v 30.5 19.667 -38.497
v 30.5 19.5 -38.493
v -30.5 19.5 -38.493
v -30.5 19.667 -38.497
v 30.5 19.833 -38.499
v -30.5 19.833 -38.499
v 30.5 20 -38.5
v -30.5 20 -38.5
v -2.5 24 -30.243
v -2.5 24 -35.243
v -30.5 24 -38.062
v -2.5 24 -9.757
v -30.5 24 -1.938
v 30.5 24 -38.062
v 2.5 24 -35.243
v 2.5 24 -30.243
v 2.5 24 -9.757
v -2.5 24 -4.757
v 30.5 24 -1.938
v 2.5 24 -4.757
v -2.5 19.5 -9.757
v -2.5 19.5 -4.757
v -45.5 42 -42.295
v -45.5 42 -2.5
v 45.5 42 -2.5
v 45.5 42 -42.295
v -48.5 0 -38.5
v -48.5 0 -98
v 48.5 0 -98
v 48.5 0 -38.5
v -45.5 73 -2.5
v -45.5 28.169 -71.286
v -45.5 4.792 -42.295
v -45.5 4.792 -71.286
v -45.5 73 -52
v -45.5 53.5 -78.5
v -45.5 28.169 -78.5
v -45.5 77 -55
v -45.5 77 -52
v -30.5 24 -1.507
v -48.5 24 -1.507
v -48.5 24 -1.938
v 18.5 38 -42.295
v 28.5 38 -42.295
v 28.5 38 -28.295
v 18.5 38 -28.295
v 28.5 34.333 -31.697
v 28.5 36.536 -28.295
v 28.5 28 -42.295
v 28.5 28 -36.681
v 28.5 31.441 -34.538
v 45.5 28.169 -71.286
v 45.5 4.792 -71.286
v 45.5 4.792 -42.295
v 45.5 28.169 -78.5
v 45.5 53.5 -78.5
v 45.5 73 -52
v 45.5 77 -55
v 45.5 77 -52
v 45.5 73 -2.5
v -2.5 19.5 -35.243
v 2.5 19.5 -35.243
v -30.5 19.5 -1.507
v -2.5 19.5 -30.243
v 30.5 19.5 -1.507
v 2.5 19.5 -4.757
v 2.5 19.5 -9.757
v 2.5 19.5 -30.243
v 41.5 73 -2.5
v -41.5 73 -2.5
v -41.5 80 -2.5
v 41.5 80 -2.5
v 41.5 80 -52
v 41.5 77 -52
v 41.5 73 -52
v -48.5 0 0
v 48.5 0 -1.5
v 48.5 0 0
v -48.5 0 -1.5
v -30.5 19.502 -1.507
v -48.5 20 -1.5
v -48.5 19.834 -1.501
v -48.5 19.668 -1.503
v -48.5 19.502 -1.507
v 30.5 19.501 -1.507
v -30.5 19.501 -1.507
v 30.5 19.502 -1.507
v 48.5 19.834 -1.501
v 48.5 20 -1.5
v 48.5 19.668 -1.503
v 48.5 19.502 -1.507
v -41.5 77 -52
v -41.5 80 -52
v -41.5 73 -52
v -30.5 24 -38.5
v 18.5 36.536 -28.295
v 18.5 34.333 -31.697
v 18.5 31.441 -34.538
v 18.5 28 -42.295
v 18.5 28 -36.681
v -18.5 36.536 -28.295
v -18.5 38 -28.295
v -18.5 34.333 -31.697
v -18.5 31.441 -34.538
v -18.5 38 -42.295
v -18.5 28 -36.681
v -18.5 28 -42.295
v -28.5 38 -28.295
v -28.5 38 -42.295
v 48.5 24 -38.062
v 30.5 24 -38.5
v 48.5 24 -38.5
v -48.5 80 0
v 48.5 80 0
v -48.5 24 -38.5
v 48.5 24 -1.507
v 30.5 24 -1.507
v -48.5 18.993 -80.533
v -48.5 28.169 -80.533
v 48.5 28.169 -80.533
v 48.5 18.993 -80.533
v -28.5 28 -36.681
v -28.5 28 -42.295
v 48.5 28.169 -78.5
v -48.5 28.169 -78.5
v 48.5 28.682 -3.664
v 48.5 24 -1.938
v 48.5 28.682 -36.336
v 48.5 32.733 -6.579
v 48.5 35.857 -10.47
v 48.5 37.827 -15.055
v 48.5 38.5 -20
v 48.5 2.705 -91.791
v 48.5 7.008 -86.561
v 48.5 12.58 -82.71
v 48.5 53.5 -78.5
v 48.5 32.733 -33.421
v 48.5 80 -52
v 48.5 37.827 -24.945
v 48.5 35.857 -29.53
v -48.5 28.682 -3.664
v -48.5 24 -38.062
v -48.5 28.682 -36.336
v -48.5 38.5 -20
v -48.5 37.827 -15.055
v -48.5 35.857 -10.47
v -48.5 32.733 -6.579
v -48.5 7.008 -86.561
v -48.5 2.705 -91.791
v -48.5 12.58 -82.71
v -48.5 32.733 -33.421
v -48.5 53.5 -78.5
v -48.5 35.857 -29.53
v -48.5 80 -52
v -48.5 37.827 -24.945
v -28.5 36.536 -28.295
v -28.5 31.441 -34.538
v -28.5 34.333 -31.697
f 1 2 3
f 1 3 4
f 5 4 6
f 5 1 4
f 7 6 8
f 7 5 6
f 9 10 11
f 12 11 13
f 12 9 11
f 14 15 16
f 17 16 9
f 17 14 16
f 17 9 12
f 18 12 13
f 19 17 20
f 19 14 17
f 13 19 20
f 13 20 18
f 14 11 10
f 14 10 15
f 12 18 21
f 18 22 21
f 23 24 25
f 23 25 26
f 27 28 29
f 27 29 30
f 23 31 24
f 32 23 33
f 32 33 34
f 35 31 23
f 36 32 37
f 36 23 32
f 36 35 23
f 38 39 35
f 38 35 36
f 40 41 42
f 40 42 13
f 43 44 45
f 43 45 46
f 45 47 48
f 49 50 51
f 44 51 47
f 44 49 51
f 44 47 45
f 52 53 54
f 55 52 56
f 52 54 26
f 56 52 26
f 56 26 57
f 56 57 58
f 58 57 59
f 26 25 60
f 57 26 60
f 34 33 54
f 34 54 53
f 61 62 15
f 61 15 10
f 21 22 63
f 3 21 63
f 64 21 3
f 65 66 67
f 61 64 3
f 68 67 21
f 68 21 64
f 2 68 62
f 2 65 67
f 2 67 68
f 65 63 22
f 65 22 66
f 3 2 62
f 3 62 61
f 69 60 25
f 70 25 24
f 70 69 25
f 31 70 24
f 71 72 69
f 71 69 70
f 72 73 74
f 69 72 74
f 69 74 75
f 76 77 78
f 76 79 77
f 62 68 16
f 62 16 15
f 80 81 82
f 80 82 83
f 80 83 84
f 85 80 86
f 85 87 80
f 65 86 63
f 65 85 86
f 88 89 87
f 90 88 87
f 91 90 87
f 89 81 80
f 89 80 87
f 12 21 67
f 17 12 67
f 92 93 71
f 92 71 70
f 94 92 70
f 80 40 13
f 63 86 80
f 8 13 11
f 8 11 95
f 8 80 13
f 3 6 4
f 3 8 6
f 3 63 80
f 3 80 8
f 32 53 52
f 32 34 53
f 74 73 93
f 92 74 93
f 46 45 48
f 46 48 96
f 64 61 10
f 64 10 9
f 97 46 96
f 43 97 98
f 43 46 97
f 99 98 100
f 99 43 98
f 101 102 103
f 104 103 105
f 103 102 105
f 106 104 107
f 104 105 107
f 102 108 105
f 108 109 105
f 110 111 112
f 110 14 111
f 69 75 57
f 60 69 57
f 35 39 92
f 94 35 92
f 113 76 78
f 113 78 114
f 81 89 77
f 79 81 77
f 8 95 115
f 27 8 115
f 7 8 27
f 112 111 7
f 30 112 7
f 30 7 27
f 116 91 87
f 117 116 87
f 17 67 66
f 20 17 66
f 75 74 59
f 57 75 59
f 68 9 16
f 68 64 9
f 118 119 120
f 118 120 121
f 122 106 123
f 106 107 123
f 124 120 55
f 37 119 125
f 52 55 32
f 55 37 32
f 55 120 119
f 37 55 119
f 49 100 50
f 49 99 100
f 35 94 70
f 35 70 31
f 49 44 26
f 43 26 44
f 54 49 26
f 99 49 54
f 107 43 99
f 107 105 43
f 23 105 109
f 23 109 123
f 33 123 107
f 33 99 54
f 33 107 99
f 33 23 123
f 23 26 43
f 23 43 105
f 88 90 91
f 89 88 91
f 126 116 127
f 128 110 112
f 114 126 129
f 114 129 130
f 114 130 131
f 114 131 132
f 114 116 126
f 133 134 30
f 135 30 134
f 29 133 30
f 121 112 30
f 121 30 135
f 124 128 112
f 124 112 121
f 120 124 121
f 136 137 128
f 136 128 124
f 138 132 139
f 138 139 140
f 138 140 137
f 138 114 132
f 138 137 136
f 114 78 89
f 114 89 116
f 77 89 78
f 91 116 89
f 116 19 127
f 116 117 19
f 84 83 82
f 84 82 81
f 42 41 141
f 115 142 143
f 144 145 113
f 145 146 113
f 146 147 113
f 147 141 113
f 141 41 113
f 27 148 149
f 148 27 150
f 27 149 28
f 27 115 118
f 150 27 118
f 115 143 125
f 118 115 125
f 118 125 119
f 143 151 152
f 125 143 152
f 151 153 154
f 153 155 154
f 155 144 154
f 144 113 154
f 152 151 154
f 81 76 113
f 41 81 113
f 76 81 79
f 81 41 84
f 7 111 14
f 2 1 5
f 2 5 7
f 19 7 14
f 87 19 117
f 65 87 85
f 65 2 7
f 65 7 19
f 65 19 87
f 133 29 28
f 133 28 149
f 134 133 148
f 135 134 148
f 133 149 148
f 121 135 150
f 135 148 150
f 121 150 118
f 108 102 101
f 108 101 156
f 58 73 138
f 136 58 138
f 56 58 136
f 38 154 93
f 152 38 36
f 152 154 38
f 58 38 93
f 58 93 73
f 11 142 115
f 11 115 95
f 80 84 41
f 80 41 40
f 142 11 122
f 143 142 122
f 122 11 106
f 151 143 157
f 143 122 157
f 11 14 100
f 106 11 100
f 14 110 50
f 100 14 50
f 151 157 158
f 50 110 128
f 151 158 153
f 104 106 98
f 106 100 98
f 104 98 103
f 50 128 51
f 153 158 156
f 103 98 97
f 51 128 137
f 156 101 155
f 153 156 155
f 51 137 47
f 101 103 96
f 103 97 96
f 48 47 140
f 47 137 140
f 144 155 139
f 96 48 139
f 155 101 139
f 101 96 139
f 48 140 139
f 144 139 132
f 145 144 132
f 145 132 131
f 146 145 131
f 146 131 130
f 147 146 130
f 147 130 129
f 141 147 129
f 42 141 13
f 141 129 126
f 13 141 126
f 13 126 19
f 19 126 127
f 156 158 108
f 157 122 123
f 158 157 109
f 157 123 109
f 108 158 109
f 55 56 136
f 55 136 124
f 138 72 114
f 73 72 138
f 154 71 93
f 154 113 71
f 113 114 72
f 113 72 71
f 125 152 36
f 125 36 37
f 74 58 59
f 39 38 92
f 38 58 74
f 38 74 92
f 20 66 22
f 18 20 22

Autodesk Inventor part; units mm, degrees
ref_plane "YZ Plane" through (0, 0, 0) normal (1, 0, 0) x (0, 1, 0)
ref_plane "XZ Plane" through (0, 0, 0) normal (0, 1, 0) x (-1, 0, 0)
ref_plane "XY Plane" through (0, 0, 0) normal (0, 0, 1) x (1, 0, 0)
sketch "Esboço1" plane through (0, 0, 0) normal (1, 0, 0) x (0, 1, 0)
  line L0 (0, 0) -> (80, 0)
  line L1 (80, 0) -> (80, -52)
  line L2 (80, -97) -> (0, -97)
  line L3 (0, -97) -> (0, 0)
  line L4 (80, 0) -> (0, 0)
  line L5 (0, 0) -> (0, -60)
  line L6 (80, -60) -> (80, 0)
  line L7 (0, 0) -> (0, -19.5)
  line L8 (19.5, 0) -> (0, 0)
  line L9 (0, -98) -> (0, -97)
  line L10 (0, -97) -> (40, -97)
  line L11 (0, 0) -> (0, -20)
  line L12 (80, 0) -> (80, -52)
  line L13 (80, -52) -> (0, -52)
  line L14 (0, -52) -> (0, -97)
  line L15 (0, -97) -> (80, -97)
  line L16 (80, -97) -> (80, -52)
  line L17 (0, -74.5) -> (0, -97)
  line L18 (0, -97) -> (80, -97)
  line L19 (80, -97) -> (80, -74.5)
  line L20 (80, -52) -> (80, -78.5)
  line L21 (53.5, -78.5) -> (28.1691, -78.5)
  line L22 (80, -52) -> (53.5, -78.5)
  arc A0 (0.0257, -97) -> (0, -98) centre (19.5, -98) ccw
  line L23 (80, -52) -> (80, -54)
  line L24 (80, -54) -> (53.5, -80.533)
  line L25 (53.5, -80.533) -> (28.1691, -80.533)
  line L26 (28.1691, -80.533) -> (28.1691, -78.5)
  arc A1 (18.9926, -80.533) -> (0, -98) centre (23.5809, -104.5813) ccw
  line L27 (28.1691, -80.533) -> (18.9926, -80.533)
  circle A2 centre (20, -20) radius 18.5
  line L28 (20, -38.5) -> (0, -38.5)
  line L29 (20, -1.5) -> (0, -1.5)
  point P0 (0, -78.5)
  point P1 (80, -78.5)
  point P2 (0.3022, -97)
  dimension "d0" = 80
  dimension "d1" = 97
  dimension "d6" = 20
  dimension "d13" = 52
  dimension "d14" = 26.5
  dimension "d15" = 26.5
  dimension "d16" = 26.5
  dimension "d17" = 19.5
  dimension "d19" = 2
  dimension "d20" = 37.5
  dimension "d75" = 37
sketch "Esboço2" plane through (0, 0, 0) normal (1, 0, 0) x (0, 1, 0)
  point P0 (0, 0)
extrude "Extrusão1" add sketch "Esboço1" along normal mid plane 97 contours L0 L1 L13 L3 L28 A2 L29 | L29 A2 L28 L3 | A2 | L22 L21 L26 L27 A1 L2 L3 L13 | L2 A0 L9 | A1 A0 L2
sketch "Esboço3" plane through (0, 0, 0) normal (1, 0, 0) x (0, 1, 0)
  line L0 (0, 0) -> (80, 0) projected
  line L1 (80, 0) -> (80, -2.5)
  line L2 (80, 0) -> (80, -52) projected
  line L3 (80, -2.5) -> (80, -5)
  line L4 (80, -2.5) -> (77, -2.5)
  line L5 (53.5, -78.5) -> (28.1691, -78.5) projected
  line L6 (77, -2.5) -> (42, -2.5)
  line L7 (42, -2.5) -> (42, -78.5)
  line L8 (42, -78.5) -> (77, -78.5)
  line L9 (77, -78.5) -> (77, -2.5)
  line L10 (28.1691, -78.5) -> (31.1691, -78.5)
  line L11 (28.1691, -78.5) -> (42, -78.5)
  line L12 (42, -78.5) -> (42, -40.5)
  line L13 (28.1691, -78.5) -> (42, -78.5)
  line L14 (42, -78.5) -> (42, -42.2949)
  line L15 (42, -42.2949) -> (28.1691, -42.2949)
  line L16 (28.1691, -42.2949) -> (28.1691, -78.5)
  line L17 (28.1691, -42.2949) -> (4.792, -42.2949)
  line L18 (4.792, -42.2949) -> (4.792, -71.2859)
  line L19 (4.792, -71.2859) -> (28.1691, -71.2859)
  point P0 (20, 0)
  dimension "d27" = 2.5
  dimension "d28" = 2.5
  dimension "d29" = 3
  dimension "d30" = 35
extrude "Extrusão2" cut sketch "Esboço3" along normal mid plane 91
sketch "Esboço4" plane through (-48.5, 80, 0) normal (0, 1, 0) x (1, 0, 0)
  line L0 (0, 0) -> (0, 52) projected
  line L1 (0, 0) -> (97, 0) projected
  line L2 (3, 2.5) -> (3, 55) projected
  line L3 (94, 2.5) -> (3, 2.5) projected
  line L4 (3, 2.5) -> (93.6926, 2.5)
  line L5 (93.6926, 2.5) -> (93.6926, 52)
  line L6 (93.6926, 52) -> (3, 52)
  line L7 (3, 52) -> (3, 2.5)
  point P0 (48.5, 0)
extrude "Extrusão3" cut sketch "Esboço4" against normal blind 8.5
sketch "Esboço5" plane through (-45.5, 77, -52) normal (0, 0, 1) x (1, 0, 0)
  line L0 (91, 0) -> (0, 0) projected
  line L1 (0, 0) -> (4, 0)
  line L2 (4, 0) -> (4, -4)
  line L3 (4, -4) -> (0, -4)
  line L4 (0, -4) -> (0, 0)
  line L5 (91, -23.5) -> (91, 0) projected
  line L6 (91, 0) -> (87, 0)
  line L7 (87, 0) -> (87, -4)
  line L8 (87, -4) -> (91, -4)
  line L9 (91, -4) -> (91, 0)
  line L10 (0, 3) -> (0, 0) projected
  line L11 (0, 3) -> (4, 3)
  line L12 (4, 3) -> (4, 0)
  line L13 (4, 0) -> (0, 0)
  line L14 (0, 0) -> (0, 3)
  line L15 (87, 3) -> (91, 3)
  line L16 (91, 3) -> (91, 0)
  line L17 (91, 0) -> (87, 0)
  line L18 (87, 0) -> (87, 3)
  point P0 (45.5, -77)
  point P1 (91, -4)
  dimension "d38" = 4
  dimension "d39" = 4
  dimension "d40" = 4
extrude "Extrusão4" add sketch "Esboço5" along normal blind 49.5
sketch "Esboço6" plane through (45.5, 4.792, -42.2949) normal (0, 0, -1) x (-1, 0, 0)
  line L0 (0, 37.208) -> (0, 33.208)
  line L1 (17, 33.208) -> (27, 33.208)
  line L2 (27, 33.208) -> (27, 23.208)
  line L3 (27, 23.208) -> (17, 23.208)
  line L4 (17, 23.208) -> (17, 33.208)
  line L5 (0, 37.208) -> (91, 37.208) projected
  line L6 (91, 37.208) -> (87, 37.208)
  line L7 (-3, 35.208) -> (94, 35.208) projected
  line L8 (91, 37.208) -> (91, 33.208)
  line L9 (74, 33.208) -> (64, 33.208)
  line L10 (64, 33.208) -> (64, 23.208)
  line L11 (64, 23.208) -> (74, 23.208)
  line L12 (74, 23.208) -> (74, 33.208)
  line L13 (91, 33.208) -> (74, 33.208)
  point P0 (45.5, -4.792)
  dimension "d43" = 4
  dimension "d44" = 17
  dimension "d45" = 10
  dimension "d46" = 10
  dimension "d52" = 10
  dimension "d53" = 10
  dimension "d54" = 17
extrude "Extrusão5" cut sketch "Esboço6" against normal blind 14 contours L12 L11 L10 L9 | L1 L2 L3 L4
sketch "Esboço9" plane through (48.5, 0, 0) normal (1, 0, 0) x (0, 0, -1)
  circle A0 centre (20, 20) radius 18.5
  line L0 (1.5, 20) -> (1.5, 0)
  line L1 (98, 0) -> (0, 0) projected
  line L2 (38.5, 20) -> (38.5, 0)
  line L3 (20, 24) -> (1.9376, 24)
  line L4 (20, 24) -> (38.0624, 24)
  line L5 (20, 19.5) -> (38.5, 19.5)
  line L6 (20, 19.5) -> (1.5, 19.5)
  point P0 (38.5, 0)
  point P1 (1.5068, 19.5)
  point P2 (38.4932, 19.5)
  dimension "d76" = 37
  dimension "d81" = 4.5
extrude "Extrusão7" cut sketch "Esboço9" against normal blind 97
extrude "Extrusão8" add sketch "Esboço9" against normal blind 97 contours A0 L5 L6 L3 L4
sketch "Esboço10" plane through (48.5, 19.5, -38.4932) normal (0, -1, 0) x (1, 0, 0)
  line L0 (-97, 0) -> (-97, 36.9865) projected
  line L1 (0, -13.5068) -> (0, 38.4932) projected
  line L2 (0, 0.4309) -> (0, 36.5556) projected
  line L3 (0, -0.0068) -> (-97, -0.0068) projected
  line L4 (-97, 36.9865) -> (-79, 36.9865)
  line L5 (-79, 36.9865) -> (-79, -0.0068)
  line L6 (-79, -0.0068) -> (-97, -0.0068)
  line L7 (-97, -0.0068) -> (-97, 36.9865)
  line L8 (0, 36.9865) -> (-97, 36.9865) projected
  line L9 (-18, 36.9865) -> (0, 36.9865)
  line L10 (0, 36.9865) -> (0, -0.0068)
  line L11 (0, -0.0068) -> (-18, -0.0068)
  line L12 (-18, -0.0068) -> (-18, 36.9865)
  point P0 (-48.5, 38.4932)
extrude "Extrusão9" cut sketch "Esboço10" against normal blind 4.5 contours L0 L4 L5 L3 L7 | L8 L1 L3 L12
sketch "Esboço11" plane through (-30.5, 19.5, -1.5068) normal (0, -1, 0) x (1, 0, 0)
  line L0 (0, 0) -> (0, -36.9865) projected
  line L1 (0, -36.9865) -> (0, -28.7365)
  line L2 (-18, 0) -> (0, 0) projected
  line L3 (0, 0) -> (0, -8.25)
  line L4 (0, -28.7365) -> (0, -8.25)
  line L5 (61, 0) -> (61, -8.25)
  line L6 (61, -36.9865) -> (61, 0) projected
  line L7 (61, -36.9865) -> (61, -28.7365)
  line L8 (61, -28.7365) -> (61, -8.25)
  line L9 (61, -18.4932) -> (33, -18.4932)
  line L10 (33, -18.4932) -> (37, -18.4932)
  line L11 (61, -18.4932) -> (57, -18.4932)
  line L12 (37, -8.25) -> (47, -8.25)
  line L13 (47, -8.25) -> (47, -28.7365)
  line L14 (47, -28.7365) -> (37, -28.7365)
  line L15 (37, -28.7365) -> (37, -8.25)
  line L16 (38, -18.4932) -> (34, -18.4932)
  line L17 (24, -8.25) -> (14, -8.25)
  line L18 (14, -8.25) -> (14, -28.7365)
  line L19 (14, -28.7365) -> (24, -28.7365)
  line L20 (24, -28.7365) -> (24, -8.25)
  line L21 (24, -18.4932) -> (28, -18.4932)
  line L22 (24, -18.4932) -> (0, -18.4932)
  line L23 (28, -8.25) -> (33, -8.25)
  line L24 (33, -8.25) -> (33, -3.25)
  line L25 (33, -3.25) -> (28, -3.25)
  line L26 (28, -3.25) -> (28, -8.25)
  line L27 (28, -28.7365) -> (33, -28.7365)
  line L28 (33, -28.7365) -> (33, -33.7365)
  line L29 (33, -33.7365) -> (28, -33.7365)
  line L30 (28, -33.7365) -> (28, -28.7365)
  point P0 (30.5, 1.5068)
  dimension "d91" = 8.25
  dimension "d92" = 8.25
  dimension "d96" = 28
  dimension "d100" = 4
  dimension "d101" = 4
  dimension "d102" = 4
  dimension "d105" = 5
  dimension "d106" = 5
  dimension "d107" = 5
  dimension "d108" = 5
extrude "Extrusão10" cut sketch "Esboço11" against normal blind 4.5 contours L26 L25 L24 L23 | L27 L28 L29 L30
equation "\"d16\" = d15"
properties part number "Mini Sumô Definitivo - CHASSI"
